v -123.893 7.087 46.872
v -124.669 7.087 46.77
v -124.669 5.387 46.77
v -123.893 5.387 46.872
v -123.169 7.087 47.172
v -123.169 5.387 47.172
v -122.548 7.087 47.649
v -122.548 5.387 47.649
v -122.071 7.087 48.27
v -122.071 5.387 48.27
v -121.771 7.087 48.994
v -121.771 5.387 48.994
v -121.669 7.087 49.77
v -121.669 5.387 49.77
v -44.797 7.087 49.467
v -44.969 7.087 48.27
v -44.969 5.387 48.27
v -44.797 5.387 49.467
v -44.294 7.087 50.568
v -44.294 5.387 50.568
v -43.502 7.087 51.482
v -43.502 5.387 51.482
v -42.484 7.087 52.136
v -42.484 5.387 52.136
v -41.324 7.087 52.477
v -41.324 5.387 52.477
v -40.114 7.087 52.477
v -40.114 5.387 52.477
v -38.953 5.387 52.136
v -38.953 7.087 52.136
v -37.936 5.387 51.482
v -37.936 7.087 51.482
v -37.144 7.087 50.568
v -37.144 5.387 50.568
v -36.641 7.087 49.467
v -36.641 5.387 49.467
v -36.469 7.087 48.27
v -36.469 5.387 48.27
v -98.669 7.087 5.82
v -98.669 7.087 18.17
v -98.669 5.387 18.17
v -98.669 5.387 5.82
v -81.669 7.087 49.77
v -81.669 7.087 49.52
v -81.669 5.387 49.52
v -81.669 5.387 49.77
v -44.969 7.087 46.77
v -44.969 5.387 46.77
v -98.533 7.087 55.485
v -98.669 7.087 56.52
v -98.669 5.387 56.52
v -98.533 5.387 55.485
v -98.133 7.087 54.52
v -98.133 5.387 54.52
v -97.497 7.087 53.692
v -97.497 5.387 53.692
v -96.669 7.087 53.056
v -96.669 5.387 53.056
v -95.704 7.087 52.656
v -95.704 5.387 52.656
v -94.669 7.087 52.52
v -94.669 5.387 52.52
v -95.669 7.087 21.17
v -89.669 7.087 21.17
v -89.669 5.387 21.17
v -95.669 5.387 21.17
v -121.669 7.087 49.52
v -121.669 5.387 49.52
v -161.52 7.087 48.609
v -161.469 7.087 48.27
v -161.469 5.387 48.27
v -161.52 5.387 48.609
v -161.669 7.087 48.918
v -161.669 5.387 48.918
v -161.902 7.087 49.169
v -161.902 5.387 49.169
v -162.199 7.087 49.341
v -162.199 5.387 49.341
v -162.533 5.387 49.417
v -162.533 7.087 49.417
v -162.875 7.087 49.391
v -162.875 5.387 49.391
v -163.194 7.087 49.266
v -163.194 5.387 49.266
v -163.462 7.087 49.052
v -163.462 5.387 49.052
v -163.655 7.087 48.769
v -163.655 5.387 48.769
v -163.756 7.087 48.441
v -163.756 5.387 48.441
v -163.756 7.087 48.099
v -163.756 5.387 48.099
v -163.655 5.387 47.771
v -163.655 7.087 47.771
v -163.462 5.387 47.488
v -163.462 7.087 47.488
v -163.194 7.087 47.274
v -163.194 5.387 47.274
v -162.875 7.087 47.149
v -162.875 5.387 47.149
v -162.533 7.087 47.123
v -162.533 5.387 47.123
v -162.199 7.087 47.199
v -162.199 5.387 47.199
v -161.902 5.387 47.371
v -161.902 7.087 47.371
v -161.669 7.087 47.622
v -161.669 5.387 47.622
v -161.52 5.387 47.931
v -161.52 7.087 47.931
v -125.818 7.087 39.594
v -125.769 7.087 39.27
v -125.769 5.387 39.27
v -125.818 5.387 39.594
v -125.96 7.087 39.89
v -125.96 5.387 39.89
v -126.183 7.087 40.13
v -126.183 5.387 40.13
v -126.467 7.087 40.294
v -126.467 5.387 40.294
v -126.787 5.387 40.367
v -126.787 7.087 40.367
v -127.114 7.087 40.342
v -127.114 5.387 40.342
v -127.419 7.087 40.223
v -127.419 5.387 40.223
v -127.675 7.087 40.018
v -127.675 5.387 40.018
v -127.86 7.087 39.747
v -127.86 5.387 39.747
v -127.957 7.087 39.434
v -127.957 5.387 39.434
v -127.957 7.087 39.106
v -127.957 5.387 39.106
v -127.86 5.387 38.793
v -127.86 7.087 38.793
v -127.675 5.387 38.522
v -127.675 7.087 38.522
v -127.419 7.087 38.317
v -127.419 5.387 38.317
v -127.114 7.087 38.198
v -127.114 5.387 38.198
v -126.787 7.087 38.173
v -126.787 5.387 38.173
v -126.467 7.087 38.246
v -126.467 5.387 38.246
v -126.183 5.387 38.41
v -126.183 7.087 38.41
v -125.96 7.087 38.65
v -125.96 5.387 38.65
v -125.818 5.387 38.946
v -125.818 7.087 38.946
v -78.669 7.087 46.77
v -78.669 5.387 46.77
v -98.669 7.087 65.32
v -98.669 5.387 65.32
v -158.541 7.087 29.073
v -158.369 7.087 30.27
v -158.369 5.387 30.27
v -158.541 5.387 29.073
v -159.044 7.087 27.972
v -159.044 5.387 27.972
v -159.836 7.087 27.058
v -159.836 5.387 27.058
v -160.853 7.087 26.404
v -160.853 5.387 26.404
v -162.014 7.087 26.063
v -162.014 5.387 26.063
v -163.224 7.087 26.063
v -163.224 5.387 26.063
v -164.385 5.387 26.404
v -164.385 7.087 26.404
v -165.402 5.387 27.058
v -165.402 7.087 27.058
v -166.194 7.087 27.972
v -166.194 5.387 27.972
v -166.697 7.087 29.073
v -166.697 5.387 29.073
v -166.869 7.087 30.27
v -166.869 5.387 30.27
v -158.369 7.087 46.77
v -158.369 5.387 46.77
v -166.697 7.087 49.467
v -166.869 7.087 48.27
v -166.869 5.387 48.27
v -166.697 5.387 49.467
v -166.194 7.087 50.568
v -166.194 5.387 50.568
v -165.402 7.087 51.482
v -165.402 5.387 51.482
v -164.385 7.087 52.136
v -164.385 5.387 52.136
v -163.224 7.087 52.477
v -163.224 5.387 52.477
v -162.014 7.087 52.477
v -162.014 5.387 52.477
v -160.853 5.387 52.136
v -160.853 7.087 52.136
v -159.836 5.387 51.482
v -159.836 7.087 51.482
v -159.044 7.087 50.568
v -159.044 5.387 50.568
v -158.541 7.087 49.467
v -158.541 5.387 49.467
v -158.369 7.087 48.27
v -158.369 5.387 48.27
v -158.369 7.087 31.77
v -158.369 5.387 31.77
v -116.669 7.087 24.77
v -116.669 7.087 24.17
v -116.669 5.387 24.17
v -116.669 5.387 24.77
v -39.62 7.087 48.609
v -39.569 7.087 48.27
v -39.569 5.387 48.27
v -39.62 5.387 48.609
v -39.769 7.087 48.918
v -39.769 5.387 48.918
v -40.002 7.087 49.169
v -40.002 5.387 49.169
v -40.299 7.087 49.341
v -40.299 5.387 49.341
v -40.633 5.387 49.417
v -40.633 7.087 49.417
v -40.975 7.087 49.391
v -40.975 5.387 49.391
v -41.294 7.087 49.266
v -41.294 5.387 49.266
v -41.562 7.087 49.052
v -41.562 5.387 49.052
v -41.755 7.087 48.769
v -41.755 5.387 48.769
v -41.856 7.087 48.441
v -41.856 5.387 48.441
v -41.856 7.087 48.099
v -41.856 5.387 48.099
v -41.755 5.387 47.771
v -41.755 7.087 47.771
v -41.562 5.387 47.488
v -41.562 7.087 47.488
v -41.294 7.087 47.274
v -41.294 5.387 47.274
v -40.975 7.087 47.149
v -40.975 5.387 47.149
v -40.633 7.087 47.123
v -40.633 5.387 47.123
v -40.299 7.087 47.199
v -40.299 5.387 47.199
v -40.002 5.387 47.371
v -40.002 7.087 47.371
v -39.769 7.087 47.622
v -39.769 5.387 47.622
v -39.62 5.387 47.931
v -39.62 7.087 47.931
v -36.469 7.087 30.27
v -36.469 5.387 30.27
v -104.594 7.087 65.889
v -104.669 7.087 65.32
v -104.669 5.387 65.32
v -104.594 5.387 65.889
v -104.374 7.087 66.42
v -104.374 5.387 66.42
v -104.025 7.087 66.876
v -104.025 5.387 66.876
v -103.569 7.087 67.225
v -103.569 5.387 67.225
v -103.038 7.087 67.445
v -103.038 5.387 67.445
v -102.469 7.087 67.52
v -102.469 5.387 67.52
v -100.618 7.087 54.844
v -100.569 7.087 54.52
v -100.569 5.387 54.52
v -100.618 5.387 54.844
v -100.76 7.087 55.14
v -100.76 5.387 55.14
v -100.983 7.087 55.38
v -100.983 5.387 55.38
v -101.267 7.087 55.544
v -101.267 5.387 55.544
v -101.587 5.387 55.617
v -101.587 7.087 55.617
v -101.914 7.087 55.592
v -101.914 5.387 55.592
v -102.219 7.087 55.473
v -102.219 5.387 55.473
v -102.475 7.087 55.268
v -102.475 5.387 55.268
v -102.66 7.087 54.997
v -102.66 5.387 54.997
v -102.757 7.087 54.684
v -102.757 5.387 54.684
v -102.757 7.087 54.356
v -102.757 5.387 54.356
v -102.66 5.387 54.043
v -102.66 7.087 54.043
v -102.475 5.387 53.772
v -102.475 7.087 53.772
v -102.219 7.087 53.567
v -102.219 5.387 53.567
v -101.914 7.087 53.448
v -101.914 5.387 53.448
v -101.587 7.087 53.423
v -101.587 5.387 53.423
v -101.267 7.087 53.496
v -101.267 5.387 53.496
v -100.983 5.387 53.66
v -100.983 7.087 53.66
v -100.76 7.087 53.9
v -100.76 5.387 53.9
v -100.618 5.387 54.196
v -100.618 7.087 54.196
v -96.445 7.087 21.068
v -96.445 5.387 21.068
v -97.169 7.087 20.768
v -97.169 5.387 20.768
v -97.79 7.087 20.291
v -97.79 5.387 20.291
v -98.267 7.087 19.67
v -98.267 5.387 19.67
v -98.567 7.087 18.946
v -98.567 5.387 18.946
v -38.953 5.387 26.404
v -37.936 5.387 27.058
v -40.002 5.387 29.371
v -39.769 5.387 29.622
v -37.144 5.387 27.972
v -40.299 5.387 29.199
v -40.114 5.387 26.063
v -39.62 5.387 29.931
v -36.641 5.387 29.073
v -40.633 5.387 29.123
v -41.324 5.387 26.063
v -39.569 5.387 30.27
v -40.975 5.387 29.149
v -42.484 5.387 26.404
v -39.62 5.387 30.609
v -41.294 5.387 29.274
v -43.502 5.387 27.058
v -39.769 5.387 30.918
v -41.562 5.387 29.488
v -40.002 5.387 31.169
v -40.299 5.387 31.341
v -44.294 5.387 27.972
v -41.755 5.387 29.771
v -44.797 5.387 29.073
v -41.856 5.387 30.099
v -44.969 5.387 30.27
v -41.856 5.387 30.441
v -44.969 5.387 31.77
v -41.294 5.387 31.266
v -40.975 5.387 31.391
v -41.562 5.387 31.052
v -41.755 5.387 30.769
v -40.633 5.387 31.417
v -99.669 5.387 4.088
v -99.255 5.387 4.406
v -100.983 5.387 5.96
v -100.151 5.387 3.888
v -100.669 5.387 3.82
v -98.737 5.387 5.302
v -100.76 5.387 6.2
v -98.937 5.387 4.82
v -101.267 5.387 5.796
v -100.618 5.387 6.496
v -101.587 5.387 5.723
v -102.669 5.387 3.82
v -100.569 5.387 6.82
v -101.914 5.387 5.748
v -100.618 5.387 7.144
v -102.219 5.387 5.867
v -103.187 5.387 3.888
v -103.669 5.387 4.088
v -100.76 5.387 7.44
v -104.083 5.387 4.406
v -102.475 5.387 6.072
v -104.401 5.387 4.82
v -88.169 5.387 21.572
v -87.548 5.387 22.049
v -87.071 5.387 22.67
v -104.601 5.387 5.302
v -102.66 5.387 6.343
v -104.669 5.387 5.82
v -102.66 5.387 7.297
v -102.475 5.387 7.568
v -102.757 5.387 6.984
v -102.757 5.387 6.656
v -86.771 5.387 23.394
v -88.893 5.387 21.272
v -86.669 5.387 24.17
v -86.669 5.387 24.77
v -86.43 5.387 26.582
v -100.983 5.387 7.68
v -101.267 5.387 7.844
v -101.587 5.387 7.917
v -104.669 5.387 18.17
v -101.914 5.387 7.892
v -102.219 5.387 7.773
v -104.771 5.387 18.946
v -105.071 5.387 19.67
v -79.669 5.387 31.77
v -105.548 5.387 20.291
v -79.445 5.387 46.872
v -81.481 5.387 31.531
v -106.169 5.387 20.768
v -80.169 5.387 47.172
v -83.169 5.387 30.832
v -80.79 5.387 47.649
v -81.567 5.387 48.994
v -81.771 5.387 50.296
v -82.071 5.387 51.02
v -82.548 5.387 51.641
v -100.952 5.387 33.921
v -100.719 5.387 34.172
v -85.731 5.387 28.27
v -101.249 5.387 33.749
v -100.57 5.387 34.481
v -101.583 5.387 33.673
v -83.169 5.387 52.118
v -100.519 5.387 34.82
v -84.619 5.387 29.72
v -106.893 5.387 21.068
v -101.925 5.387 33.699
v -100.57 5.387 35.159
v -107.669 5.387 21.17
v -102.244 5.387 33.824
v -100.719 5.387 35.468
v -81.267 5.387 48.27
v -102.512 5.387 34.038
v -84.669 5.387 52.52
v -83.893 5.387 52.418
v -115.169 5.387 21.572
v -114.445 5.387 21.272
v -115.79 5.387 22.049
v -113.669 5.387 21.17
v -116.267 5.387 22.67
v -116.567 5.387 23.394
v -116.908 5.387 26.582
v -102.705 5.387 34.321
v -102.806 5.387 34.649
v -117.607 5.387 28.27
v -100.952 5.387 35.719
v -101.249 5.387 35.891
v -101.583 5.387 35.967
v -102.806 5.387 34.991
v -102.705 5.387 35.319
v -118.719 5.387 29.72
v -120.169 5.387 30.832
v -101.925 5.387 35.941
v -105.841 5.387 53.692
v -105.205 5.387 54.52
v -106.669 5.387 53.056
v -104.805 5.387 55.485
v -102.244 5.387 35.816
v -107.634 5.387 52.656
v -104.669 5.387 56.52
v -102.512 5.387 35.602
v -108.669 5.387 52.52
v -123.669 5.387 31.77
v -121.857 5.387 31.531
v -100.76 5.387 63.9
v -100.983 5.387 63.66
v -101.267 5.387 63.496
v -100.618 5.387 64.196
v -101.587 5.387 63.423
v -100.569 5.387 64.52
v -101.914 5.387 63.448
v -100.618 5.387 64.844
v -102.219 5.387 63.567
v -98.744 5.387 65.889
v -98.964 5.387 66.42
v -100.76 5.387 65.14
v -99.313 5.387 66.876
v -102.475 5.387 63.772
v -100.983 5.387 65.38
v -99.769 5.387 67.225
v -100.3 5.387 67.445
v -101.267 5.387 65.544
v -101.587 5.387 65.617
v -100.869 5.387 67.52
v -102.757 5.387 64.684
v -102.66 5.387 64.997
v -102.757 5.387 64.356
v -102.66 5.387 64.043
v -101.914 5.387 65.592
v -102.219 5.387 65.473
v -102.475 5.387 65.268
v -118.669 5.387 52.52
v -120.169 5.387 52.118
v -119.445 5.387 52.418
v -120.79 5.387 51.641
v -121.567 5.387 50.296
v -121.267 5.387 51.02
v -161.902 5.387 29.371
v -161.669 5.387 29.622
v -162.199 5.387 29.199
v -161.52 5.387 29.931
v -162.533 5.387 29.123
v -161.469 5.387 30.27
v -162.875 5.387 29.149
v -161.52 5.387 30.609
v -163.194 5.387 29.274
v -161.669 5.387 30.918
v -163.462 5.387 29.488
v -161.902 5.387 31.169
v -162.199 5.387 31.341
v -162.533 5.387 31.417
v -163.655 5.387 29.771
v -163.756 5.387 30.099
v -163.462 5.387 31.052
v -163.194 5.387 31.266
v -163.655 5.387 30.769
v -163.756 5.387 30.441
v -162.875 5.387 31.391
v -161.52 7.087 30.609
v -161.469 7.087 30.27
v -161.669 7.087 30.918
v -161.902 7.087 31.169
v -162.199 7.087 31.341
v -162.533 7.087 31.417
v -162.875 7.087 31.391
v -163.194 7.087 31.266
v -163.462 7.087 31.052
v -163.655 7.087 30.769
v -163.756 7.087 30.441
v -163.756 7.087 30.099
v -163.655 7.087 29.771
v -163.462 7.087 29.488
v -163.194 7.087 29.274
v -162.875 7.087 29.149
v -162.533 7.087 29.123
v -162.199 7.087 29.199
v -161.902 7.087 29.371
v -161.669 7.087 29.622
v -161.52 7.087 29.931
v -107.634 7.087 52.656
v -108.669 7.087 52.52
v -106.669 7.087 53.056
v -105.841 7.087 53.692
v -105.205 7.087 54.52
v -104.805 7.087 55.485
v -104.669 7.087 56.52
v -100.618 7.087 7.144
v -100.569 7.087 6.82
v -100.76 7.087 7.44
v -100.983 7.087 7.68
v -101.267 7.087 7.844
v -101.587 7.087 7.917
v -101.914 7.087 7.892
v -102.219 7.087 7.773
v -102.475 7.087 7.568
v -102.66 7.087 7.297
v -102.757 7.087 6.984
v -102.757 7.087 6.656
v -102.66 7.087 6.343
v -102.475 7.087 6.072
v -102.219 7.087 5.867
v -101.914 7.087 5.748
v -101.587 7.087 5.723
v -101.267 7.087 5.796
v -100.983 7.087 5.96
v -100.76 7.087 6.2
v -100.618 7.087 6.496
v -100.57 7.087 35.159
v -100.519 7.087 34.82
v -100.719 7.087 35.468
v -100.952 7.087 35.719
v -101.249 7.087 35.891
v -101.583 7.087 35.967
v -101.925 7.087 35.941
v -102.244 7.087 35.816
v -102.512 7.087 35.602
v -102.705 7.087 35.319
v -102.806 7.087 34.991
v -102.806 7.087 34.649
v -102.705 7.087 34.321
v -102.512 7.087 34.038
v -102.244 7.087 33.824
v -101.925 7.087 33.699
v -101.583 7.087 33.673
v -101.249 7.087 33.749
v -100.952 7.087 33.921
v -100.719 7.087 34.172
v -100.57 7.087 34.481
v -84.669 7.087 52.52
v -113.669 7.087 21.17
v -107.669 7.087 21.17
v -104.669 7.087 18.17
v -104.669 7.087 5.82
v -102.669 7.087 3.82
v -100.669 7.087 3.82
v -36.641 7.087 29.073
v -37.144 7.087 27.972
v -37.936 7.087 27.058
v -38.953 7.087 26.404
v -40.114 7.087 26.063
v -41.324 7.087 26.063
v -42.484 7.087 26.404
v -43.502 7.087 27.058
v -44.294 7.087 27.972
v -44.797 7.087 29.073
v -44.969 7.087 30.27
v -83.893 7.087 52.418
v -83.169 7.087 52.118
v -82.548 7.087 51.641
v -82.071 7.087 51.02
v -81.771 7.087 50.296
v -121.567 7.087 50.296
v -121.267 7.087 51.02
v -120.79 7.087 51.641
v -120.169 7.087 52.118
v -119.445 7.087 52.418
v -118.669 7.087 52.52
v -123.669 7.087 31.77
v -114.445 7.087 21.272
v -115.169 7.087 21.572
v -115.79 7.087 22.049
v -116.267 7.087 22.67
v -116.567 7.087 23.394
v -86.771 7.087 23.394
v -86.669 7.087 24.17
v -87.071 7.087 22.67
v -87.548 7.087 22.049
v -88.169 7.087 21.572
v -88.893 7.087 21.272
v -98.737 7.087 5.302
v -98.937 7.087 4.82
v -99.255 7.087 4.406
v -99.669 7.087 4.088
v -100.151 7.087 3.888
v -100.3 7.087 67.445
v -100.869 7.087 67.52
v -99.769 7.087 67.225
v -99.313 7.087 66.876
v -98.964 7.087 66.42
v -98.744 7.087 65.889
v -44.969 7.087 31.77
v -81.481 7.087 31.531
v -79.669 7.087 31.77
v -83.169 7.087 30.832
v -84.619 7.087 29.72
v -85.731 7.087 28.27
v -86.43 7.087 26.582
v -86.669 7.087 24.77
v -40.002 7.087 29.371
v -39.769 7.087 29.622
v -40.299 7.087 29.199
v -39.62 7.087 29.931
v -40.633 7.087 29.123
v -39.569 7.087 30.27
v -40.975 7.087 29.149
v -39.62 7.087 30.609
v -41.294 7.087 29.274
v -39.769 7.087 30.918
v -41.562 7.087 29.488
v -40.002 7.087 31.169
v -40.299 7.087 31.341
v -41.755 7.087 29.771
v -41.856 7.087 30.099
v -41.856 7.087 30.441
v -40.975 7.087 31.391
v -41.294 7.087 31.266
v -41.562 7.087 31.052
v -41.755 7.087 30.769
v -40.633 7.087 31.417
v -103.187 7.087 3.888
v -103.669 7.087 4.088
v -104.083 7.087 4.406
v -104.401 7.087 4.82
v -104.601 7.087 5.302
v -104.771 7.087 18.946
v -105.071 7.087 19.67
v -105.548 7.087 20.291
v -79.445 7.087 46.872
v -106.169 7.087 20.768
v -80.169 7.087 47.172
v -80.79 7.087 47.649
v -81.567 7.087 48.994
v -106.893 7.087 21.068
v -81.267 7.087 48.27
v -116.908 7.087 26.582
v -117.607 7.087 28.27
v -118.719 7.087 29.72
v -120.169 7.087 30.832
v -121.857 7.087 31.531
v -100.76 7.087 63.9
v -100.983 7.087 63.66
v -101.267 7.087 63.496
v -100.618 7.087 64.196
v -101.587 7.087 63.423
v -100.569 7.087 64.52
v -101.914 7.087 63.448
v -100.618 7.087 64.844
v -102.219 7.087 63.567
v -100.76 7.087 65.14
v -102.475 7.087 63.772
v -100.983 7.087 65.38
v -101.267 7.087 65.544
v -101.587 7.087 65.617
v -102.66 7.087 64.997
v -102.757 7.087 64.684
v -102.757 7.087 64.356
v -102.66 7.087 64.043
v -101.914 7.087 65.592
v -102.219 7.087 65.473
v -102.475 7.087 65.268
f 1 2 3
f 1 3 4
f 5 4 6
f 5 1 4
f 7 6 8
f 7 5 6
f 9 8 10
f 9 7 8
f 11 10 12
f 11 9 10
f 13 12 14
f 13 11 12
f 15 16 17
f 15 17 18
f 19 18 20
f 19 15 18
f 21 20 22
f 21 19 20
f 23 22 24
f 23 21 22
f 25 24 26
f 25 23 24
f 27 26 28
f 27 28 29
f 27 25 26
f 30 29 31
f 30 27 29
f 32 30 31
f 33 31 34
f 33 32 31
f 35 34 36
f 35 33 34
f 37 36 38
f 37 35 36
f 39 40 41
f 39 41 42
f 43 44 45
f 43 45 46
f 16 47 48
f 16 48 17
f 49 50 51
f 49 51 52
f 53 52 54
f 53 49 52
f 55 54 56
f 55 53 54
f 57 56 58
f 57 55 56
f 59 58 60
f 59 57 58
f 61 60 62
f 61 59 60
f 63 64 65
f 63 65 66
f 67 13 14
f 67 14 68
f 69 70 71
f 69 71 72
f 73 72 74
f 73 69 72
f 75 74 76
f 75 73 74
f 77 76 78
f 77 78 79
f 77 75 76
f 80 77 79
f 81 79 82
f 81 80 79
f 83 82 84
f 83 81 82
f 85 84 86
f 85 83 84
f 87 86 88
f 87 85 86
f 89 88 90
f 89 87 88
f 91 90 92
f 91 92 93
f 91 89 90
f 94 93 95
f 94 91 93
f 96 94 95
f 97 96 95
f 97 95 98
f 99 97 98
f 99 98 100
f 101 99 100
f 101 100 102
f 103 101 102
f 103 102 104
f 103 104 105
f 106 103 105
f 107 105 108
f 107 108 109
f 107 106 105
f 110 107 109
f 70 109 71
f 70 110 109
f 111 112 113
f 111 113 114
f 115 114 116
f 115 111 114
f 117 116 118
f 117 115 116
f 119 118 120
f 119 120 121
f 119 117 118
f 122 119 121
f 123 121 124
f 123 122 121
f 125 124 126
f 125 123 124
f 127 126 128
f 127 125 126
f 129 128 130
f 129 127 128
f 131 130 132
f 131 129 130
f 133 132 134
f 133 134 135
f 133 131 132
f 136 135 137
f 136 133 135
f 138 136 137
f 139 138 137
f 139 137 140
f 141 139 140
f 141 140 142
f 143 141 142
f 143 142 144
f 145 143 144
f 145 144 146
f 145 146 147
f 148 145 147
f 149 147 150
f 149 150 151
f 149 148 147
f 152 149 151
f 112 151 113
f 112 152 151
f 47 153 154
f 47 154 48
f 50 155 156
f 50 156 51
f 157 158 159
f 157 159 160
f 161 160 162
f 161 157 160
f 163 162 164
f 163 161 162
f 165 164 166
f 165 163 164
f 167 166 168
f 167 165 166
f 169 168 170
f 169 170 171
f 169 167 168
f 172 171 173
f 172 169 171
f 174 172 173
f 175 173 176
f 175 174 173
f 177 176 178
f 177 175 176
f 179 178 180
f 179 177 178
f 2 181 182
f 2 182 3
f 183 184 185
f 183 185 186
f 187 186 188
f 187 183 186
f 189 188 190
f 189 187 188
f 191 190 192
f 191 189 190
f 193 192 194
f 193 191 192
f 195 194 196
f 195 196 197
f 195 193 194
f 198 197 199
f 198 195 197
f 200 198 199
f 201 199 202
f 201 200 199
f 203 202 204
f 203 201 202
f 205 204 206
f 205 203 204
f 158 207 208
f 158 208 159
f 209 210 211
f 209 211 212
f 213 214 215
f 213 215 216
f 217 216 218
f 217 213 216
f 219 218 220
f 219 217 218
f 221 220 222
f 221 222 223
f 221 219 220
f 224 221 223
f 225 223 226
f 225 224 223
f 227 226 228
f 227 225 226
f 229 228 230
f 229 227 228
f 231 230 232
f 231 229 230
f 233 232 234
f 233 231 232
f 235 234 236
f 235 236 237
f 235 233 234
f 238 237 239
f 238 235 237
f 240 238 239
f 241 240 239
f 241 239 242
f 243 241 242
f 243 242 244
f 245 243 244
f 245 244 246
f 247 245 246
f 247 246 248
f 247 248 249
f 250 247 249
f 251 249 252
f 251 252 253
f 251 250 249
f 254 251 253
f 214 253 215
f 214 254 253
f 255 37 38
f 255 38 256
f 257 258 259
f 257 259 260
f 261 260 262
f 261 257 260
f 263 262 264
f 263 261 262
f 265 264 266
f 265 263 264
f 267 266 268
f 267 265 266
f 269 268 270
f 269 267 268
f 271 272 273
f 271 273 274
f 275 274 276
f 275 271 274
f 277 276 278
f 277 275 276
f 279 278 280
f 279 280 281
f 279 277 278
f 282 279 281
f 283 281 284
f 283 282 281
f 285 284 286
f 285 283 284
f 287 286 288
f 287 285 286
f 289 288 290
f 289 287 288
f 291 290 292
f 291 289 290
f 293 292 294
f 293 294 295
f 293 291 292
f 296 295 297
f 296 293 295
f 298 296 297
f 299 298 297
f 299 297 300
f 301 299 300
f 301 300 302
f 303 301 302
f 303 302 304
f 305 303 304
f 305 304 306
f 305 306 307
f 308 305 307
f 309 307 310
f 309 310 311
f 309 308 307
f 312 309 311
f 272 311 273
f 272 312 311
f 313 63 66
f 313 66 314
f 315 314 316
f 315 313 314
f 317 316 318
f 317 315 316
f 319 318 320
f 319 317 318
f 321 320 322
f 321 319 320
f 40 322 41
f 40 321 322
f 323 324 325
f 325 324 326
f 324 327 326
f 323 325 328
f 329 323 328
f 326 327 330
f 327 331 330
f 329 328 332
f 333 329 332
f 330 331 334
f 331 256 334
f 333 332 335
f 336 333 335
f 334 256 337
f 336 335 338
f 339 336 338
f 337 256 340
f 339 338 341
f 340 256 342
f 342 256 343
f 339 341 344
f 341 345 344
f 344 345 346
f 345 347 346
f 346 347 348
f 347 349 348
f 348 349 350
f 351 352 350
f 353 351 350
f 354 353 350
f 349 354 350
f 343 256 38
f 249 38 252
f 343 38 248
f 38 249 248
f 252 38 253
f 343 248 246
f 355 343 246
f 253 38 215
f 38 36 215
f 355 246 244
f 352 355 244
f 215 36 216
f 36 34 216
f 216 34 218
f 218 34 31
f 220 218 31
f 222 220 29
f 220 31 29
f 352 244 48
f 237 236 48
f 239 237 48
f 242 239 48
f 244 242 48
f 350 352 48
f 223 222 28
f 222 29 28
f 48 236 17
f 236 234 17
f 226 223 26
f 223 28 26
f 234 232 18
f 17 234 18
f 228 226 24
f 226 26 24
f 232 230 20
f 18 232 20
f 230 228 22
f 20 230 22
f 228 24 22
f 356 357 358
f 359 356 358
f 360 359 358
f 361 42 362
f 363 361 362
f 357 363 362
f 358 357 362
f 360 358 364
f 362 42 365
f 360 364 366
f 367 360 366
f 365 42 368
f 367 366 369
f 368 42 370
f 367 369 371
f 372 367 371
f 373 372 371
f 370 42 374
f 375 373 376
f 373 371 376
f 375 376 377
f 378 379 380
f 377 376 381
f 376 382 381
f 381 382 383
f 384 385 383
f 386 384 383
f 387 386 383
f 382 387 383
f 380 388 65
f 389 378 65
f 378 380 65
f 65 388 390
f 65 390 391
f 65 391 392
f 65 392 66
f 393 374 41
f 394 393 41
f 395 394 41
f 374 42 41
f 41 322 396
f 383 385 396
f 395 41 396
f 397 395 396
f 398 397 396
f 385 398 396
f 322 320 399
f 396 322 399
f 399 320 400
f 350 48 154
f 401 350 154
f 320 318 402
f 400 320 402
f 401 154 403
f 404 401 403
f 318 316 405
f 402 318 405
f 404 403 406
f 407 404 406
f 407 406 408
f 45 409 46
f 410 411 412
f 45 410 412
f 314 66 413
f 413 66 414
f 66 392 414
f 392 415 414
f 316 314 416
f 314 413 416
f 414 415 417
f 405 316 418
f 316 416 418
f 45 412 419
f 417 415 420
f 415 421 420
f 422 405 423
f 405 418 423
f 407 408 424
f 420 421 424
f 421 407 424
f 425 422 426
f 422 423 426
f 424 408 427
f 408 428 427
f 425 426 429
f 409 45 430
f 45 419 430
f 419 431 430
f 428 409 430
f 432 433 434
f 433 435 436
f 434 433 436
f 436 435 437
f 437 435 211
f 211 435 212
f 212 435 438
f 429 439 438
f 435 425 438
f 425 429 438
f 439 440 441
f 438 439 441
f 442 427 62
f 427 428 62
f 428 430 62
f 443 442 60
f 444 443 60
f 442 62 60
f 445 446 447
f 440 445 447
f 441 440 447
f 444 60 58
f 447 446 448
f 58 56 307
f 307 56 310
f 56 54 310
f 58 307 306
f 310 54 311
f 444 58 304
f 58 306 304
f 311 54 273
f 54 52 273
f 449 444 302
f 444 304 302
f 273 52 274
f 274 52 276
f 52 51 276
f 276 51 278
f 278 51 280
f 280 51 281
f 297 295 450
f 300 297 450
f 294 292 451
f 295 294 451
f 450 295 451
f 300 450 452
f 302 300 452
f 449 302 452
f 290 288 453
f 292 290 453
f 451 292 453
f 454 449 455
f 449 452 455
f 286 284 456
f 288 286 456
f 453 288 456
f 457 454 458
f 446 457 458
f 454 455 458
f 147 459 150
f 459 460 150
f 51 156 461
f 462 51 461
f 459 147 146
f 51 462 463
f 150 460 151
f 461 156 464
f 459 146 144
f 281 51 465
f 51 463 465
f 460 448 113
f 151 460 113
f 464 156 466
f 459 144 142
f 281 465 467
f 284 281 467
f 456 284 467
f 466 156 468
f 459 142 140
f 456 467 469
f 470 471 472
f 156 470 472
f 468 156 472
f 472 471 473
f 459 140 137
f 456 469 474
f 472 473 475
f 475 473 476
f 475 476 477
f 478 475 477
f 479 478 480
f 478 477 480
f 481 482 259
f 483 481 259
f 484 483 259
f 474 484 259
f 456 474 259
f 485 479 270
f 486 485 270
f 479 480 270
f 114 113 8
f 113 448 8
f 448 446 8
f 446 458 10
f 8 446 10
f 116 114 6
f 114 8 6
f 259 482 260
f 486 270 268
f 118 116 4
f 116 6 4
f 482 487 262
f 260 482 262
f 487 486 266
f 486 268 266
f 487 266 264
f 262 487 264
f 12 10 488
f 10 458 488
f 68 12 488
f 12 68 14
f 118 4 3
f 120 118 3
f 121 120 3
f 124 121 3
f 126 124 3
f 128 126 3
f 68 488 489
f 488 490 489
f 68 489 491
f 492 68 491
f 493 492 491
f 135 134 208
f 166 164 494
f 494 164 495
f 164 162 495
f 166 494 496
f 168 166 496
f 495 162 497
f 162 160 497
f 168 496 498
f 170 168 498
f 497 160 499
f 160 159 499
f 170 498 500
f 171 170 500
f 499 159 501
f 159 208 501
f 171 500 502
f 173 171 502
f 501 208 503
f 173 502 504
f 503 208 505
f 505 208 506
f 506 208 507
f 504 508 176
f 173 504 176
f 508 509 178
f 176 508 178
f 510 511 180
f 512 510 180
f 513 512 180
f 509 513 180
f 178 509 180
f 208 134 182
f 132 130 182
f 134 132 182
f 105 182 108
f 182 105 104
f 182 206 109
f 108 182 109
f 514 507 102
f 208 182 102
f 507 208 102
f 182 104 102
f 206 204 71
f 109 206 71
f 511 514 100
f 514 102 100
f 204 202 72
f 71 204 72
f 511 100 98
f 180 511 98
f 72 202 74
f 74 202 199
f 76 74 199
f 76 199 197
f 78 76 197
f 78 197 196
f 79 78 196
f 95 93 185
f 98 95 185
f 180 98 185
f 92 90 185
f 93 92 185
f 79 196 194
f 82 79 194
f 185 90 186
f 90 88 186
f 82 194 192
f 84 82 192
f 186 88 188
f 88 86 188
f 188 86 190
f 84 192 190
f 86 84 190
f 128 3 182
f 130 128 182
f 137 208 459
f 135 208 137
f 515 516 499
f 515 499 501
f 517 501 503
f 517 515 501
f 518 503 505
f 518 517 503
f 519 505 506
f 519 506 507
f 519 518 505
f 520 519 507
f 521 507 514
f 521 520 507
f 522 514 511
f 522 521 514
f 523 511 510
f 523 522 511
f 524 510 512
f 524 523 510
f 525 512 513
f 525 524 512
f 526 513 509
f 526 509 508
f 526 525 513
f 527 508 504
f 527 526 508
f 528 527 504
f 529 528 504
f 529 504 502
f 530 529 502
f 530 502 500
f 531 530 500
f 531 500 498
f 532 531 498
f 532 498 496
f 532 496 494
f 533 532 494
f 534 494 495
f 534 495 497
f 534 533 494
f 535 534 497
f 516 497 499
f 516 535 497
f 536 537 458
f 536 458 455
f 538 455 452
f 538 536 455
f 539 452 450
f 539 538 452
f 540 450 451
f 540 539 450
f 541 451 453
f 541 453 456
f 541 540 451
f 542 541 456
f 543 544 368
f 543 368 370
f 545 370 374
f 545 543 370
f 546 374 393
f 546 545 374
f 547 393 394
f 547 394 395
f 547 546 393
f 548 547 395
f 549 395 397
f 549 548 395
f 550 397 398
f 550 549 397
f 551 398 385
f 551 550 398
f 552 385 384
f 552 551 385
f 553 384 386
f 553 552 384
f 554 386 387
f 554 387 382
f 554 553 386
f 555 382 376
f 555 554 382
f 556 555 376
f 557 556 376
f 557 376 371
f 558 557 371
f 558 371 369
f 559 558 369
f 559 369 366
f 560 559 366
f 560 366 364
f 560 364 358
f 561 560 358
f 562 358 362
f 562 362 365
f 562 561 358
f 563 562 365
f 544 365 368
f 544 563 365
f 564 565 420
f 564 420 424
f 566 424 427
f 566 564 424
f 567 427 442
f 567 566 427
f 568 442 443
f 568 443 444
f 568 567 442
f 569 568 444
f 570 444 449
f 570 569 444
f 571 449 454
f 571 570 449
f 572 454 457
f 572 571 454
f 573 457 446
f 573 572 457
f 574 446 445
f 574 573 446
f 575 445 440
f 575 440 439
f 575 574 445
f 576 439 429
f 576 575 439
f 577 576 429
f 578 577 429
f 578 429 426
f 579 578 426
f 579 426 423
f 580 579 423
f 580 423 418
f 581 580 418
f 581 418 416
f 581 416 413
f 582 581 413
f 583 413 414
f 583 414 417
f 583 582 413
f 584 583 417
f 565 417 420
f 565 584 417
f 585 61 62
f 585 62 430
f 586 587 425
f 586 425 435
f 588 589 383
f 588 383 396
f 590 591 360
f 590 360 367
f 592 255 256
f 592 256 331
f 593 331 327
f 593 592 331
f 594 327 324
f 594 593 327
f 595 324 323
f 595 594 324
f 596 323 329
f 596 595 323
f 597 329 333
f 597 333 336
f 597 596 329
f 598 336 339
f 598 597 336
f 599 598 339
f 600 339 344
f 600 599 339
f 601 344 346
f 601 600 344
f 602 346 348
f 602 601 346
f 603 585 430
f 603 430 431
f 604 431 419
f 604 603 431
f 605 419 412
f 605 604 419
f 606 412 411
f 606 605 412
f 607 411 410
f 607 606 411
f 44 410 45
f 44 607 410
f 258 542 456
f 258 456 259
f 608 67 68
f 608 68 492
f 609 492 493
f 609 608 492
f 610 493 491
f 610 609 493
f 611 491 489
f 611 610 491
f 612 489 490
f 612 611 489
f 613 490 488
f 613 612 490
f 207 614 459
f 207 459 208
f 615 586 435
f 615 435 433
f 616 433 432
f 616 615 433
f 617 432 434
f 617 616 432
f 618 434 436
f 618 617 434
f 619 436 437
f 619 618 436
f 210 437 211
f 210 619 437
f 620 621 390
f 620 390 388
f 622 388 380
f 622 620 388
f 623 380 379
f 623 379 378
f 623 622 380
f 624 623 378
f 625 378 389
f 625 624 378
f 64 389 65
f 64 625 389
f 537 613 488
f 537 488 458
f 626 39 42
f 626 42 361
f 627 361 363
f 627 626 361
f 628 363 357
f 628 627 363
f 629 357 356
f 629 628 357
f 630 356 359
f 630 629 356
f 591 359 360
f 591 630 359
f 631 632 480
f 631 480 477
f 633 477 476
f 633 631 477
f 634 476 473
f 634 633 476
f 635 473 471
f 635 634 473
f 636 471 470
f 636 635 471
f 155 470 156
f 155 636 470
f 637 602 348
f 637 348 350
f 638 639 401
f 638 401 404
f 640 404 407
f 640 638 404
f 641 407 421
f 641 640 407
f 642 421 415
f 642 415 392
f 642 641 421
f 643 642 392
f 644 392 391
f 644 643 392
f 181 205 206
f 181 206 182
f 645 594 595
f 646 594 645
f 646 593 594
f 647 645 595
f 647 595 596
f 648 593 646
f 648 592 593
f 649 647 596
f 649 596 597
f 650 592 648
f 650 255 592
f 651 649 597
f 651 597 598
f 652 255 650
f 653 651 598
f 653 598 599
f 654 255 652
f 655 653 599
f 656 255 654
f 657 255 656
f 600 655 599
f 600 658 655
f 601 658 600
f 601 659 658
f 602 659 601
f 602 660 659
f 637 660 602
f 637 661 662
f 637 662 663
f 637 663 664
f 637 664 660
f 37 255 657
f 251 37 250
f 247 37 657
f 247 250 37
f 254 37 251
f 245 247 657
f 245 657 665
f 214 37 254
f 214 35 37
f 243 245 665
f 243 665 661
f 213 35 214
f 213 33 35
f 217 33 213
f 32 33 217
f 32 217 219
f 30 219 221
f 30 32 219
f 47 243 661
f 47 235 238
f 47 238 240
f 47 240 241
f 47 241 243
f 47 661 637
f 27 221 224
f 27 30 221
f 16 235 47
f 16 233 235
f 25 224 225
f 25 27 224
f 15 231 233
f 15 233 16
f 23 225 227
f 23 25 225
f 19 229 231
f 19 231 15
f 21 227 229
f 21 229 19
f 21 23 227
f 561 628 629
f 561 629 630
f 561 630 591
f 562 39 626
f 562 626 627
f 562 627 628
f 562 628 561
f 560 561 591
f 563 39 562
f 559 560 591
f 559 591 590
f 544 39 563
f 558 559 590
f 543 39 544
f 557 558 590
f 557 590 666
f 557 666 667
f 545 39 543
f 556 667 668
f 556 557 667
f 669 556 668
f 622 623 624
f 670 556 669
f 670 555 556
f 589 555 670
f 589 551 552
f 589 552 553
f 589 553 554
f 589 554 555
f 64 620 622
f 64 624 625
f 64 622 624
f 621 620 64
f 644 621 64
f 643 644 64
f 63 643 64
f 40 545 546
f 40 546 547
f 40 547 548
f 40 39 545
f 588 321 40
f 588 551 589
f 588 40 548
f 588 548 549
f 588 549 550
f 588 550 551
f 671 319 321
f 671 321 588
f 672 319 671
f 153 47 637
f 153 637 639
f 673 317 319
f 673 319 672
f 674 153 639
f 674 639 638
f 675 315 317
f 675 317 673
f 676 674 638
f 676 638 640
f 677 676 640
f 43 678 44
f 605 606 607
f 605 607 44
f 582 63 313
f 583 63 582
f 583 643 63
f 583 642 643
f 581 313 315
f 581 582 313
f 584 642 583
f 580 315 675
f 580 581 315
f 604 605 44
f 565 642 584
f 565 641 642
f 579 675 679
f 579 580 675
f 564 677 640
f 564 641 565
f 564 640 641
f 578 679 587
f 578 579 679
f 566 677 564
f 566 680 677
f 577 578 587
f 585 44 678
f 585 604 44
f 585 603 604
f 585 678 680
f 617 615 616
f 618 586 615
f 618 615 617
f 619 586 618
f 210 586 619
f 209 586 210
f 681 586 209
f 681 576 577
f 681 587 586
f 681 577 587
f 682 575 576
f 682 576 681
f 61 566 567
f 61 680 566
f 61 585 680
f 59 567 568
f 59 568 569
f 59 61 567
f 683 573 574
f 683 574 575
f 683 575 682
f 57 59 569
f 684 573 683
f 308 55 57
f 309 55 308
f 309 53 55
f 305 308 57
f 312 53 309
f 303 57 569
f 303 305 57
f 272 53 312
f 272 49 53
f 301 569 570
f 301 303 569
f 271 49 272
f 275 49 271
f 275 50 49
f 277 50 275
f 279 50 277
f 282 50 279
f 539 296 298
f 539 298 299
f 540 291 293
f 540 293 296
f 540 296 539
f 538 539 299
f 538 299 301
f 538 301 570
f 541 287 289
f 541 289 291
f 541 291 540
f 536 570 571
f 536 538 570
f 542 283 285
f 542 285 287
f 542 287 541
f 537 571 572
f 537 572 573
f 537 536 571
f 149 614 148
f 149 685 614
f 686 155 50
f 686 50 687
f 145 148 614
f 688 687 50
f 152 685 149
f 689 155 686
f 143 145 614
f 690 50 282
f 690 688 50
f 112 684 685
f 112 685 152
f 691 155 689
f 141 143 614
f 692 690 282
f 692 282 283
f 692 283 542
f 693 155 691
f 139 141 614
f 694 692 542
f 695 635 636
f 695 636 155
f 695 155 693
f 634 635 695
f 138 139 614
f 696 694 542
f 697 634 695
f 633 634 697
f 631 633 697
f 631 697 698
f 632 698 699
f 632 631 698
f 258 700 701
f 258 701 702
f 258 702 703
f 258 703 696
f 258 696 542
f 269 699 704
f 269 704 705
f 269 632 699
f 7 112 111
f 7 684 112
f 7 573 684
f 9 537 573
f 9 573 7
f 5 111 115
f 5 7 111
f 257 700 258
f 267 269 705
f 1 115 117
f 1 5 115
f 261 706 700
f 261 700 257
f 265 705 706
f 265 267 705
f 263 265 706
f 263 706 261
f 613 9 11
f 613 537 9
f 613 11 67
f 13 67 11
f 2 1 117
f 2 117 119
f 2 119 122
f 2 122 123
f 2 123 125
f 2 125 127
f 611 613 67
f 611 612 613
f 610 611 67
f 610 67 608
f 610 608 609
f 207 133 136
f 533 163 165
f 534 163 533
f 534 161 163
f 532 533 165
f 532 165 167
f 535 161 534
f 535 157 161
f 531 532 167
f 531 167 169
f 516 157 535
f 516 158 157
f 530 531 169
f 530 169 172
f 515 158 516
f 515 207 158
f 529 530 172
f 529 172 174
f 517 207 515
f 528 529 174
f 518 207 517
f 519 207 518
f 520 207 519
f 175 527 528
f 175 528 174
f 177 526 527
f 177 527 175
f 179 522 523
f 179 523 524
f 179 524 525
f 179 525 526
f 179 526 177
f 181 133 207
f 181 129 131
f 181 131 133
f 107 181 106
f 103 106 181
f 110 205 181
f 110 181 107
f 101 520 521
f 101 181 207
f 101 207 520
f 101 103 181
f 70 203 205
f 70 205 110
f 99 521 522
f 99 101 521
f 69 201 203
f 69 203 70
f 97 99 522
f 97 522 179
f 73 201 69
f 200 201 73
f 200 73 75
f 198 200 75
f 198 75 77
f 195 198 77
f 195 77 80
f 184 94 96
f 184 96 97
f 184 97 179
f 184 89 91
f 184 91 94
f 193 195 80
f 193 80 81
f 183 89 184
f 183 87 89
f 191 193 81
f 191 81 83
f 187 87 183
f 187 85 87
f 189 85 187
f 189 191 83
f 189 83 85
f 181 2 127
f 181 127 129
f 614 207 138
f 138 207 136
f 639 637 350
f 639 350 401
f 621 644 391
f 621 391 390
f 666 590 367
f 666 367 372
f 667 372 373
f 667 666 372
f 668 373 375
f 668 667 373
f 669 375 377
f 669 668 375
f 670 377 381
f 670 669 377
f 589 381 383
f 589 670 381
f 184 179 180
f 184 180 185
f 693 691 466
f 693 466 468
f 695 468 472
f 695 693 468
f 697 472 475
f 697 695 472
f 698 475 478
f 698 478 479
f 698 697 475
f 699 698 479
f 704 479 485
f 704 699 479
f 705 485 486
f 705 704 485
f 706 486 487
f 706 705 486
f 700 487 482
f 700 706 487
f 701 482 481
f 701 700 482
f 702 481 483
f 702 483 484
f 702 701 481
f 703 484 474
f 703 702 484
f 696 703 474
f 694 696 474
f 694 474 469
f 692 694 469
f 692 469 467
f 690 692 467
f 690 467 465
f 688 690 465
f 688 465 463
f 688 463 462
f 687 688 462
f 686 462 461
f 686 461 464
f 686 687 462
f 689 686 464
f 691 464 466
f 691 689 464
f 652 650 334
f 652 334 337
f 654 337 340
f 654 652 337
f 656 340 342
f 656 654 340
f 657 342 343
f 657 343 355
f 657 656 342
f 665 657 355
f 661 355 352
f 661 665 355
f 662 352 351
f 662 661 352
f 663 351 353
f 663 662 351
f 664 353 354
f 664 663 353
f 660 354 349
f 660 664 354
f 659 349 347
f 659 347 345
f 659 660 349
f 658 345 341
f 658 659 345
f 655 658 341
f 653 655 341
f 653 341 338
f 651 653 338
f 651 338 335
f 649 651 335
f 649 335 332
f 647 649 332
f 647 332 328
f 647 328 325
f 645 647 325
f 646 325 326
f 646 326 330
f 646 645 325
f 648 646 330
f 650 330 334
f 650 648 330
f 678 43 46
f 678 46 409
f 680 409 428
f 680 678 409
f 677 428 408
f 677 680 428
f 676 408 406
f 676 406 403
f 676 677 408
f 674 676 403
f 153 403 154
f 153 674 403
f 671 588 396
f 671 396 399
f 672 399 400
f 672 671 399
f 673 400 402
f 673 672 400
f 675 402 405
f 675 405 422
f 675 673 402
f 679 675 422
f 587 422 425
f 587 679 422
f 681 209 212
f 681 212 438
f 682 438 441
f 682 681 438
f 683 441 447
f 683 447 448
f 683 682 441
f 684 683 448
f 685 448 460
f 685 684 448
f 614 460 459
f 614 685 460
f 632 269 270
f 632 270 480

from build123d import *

# Parameters (mm, degrees)
SZKIC1_R                    = 1.15
SZKIC1_R_2                  = 1.150012437
SZKIC1_R_3                  = 1.1
DODANIE_WYCI_GNI_CIE1_DEPTH = 1.7


with BuildPart() as part:
    # Szkic1 → Dodanie-wyciągnięcie1 (new body)
    with BuildSketch(Plane.XZ.offset(-7.087491716)):
        with BuildLine():
            Line((-166.869010382, 45.27), (-166.869010382, 48.27))
            ThreePointArc((-166.869010382, 48.27), (-162.619010382, 52.52), (-158.369010382, 48.27))
            Line((-158.369010382, 48.27), (-158.369010382, 46.77))
            Line((-158.369010382, 46.77), (-124.668997945, 46.77))
            ThreePointArc((-124.668997945, 46.77), (-122.547677602, 47.648679656), (-121.668997945, 49.77))
            Line((-121.668997945, 49.77), (-121.668997945, 49.52))
            ThreePointArc((-121.668997945, 49.52), (-120.790318289, 51.641320344), (-118.668997945, 52.52))
            Line((-118.668997945, 52.52), (-108.668997945, 52.52))
            ThreePointArc((-108.668997945, 52.52), (-105.840570821, 53.691572875), (-104.668997945, 56.52))
            Line((-104.668997945, 56.52), (-104.668997945, 65.32))
            ThreePointArc((-104.668997945, 65.32), (-104.024632864, 66.875634919), (-102.468997945, 67.52))
            Line((-102.468997945, 67.52), (-100.868997945, 67.52))
            ThreePointArc((-100.868997945, 67.52), (-99.313363027, 66.875634919), (-98.668997945, 65.32))
            Line((-98.668997945, 65.32), (-98.668997945, 56.52))
            ThreePointArc((-98.668997945, 56.52), (-97.49742507, 53.691572875), (-94.668997945, 52.52))
            Line((-94.668997945, 52.52), (-84.668997945, 52.52))
            ThreePointArc((-84.668997945, 52.52), (-82.547677602, 51.641320344), (-81.668997945, 49.52))
            Line((-81.668997945, 49.52), (-81.668997945, 49.77))
            ThreePointArc((-81.668997945, 49.77), (-80.790318289, 47.648679656), (-78.668997945, 46.77))
            Line((-78.668997945, 46.77), (-44.968985509, 46.77))
            Line((-44.968985509, 46.77), (-44.968985509, 48.27))
            ThreePointArc((-44.968985509, 48.27), (-40.718985509, 52.52), (-36.468985509, 48.27))
            Line((-36.468985509, 48.27), (-36.468985509, 45.27))
            Line((-36.468985509, 45.27), (-36.468985509, 33.27))
            Line((-36.468985509, 33.27), (-36.468985509, 30.27))
            ThreePointArc((-36.468985509, 30.27), (-40.718985509, 26.02), (-44.968985509, 30.27))
            Line((-44.968985509, 30.27), (-44.968985509, 31.77))
            Line((-44.968985509, 31.77), (-79.668997945, 31.77))
            ThreePointArc((-79.668997945, 31.77), (-84.618745414, 29.719747468), (-86.668997945, 24.77))
            Line((-86.668997945, 24.77), (-86.668997945, 24.17))
            ThreePointArc((-86.668997945, 24.17), (-87.547677602, 22.048679656), (-89.668997945, 21.17))
            Line((-89.668997945, 21.17), (-95.668997945, 21.17))
            ThreePointArc((-95.668997945, 21.17), (-97.790318289, 20.291320344), (-98.668997945, 18.17))
            Line((-98.668997945, 18.17), (-98.668997945, 5.82))
            ThreePointArc((-98.668997945, 5.82), (-99.254784383, 4.405786438), (-100.668997945, 3.82))
            Line((-100.668997945, 3.82), (-102.668997945, 3.82))
            ThreePointArc((-102.668997945, 3.82), (-104.083211508, 4.405786438), (-104.668997945, 5.82))
            Line((-104.668997945, 5.82), (-104.668997945, 18.17))
            ThreePointArc((-104.668997945, 18.17), (-105.547677602, 20.291320344), (-107.668997945, 21.17))
            Line((-107.668997945, 21.17), (-113.668997945, 21.17))
            ThreePointArc((-113.668997945, 21.17), (-115.790318289, 22.048679656), (-116.668997945, 24.17))
            Line((-116.668997945, 24.17), (-116.668997945, 24.77))
            ThreePointArc((-116.668997945, 24.77), (-118.719250477, 29.719747468), (-123.668997945, 31.77))
            Line((-123.668997945, 31.77), (-158.369010382, 31.77))
            Line((-158.369010382, 31.77), (-158.369010382, 30.27))
            ThreePointArc((-158.369010382, 30.27), (-162.619010382, 26.02), (-166.869010382, 30.27))
            Line((-166.869010382, 30.27), (-166.869010382, 33.27))
            Line((-166.869010382, 33.27), (-166.869010382, 45.27))
        make_face()
        with Locations((-162.618997945, 30.27)):
            Circle(SZKIC1_R, mode=Mode.SUBTRACT)
        with Locations((-162.618997945, 48.27)):
            Circle(SZKIC1_R, mode=Mode.SUBTRACT)
        with Locations((-40.718985509, 48.27)):
            Circle(SZKIC1_R_2, mode=Mode.SUBTRACT)
        with Locations((-40.718985509, 30.27)):
            Circle(SZKIC1_R_2, mode=Mode.SUBTRACT)
        with Locations((-101.668997945, 6.82)):
            Circle(SZKIC1_R_3, mode=Mode.SUBTRACT)
        with Locations((-126.869010382, 39.27)):
            Circle(SZKIC1_R_3, mode=Mode.SUBTRACT)
        with Locations((-101.668997945, 54.52)):
            Circle(SZKIC1_R_3, mode=Mode.SUBTRACT)
        with Locations((-101.668997945, 64.52)):
            Circle(SZKIC1_R_3, mode=Mode.SUBTRACT)
        with Locations((-101.668997945, 34.82)):
            Circle(SZKIC1_R, mode=Mode.SUBTRACT)
    extrude(amount=DODANIE_WYCI_GNI_CIE1_DEPTH)


solid = part.part
